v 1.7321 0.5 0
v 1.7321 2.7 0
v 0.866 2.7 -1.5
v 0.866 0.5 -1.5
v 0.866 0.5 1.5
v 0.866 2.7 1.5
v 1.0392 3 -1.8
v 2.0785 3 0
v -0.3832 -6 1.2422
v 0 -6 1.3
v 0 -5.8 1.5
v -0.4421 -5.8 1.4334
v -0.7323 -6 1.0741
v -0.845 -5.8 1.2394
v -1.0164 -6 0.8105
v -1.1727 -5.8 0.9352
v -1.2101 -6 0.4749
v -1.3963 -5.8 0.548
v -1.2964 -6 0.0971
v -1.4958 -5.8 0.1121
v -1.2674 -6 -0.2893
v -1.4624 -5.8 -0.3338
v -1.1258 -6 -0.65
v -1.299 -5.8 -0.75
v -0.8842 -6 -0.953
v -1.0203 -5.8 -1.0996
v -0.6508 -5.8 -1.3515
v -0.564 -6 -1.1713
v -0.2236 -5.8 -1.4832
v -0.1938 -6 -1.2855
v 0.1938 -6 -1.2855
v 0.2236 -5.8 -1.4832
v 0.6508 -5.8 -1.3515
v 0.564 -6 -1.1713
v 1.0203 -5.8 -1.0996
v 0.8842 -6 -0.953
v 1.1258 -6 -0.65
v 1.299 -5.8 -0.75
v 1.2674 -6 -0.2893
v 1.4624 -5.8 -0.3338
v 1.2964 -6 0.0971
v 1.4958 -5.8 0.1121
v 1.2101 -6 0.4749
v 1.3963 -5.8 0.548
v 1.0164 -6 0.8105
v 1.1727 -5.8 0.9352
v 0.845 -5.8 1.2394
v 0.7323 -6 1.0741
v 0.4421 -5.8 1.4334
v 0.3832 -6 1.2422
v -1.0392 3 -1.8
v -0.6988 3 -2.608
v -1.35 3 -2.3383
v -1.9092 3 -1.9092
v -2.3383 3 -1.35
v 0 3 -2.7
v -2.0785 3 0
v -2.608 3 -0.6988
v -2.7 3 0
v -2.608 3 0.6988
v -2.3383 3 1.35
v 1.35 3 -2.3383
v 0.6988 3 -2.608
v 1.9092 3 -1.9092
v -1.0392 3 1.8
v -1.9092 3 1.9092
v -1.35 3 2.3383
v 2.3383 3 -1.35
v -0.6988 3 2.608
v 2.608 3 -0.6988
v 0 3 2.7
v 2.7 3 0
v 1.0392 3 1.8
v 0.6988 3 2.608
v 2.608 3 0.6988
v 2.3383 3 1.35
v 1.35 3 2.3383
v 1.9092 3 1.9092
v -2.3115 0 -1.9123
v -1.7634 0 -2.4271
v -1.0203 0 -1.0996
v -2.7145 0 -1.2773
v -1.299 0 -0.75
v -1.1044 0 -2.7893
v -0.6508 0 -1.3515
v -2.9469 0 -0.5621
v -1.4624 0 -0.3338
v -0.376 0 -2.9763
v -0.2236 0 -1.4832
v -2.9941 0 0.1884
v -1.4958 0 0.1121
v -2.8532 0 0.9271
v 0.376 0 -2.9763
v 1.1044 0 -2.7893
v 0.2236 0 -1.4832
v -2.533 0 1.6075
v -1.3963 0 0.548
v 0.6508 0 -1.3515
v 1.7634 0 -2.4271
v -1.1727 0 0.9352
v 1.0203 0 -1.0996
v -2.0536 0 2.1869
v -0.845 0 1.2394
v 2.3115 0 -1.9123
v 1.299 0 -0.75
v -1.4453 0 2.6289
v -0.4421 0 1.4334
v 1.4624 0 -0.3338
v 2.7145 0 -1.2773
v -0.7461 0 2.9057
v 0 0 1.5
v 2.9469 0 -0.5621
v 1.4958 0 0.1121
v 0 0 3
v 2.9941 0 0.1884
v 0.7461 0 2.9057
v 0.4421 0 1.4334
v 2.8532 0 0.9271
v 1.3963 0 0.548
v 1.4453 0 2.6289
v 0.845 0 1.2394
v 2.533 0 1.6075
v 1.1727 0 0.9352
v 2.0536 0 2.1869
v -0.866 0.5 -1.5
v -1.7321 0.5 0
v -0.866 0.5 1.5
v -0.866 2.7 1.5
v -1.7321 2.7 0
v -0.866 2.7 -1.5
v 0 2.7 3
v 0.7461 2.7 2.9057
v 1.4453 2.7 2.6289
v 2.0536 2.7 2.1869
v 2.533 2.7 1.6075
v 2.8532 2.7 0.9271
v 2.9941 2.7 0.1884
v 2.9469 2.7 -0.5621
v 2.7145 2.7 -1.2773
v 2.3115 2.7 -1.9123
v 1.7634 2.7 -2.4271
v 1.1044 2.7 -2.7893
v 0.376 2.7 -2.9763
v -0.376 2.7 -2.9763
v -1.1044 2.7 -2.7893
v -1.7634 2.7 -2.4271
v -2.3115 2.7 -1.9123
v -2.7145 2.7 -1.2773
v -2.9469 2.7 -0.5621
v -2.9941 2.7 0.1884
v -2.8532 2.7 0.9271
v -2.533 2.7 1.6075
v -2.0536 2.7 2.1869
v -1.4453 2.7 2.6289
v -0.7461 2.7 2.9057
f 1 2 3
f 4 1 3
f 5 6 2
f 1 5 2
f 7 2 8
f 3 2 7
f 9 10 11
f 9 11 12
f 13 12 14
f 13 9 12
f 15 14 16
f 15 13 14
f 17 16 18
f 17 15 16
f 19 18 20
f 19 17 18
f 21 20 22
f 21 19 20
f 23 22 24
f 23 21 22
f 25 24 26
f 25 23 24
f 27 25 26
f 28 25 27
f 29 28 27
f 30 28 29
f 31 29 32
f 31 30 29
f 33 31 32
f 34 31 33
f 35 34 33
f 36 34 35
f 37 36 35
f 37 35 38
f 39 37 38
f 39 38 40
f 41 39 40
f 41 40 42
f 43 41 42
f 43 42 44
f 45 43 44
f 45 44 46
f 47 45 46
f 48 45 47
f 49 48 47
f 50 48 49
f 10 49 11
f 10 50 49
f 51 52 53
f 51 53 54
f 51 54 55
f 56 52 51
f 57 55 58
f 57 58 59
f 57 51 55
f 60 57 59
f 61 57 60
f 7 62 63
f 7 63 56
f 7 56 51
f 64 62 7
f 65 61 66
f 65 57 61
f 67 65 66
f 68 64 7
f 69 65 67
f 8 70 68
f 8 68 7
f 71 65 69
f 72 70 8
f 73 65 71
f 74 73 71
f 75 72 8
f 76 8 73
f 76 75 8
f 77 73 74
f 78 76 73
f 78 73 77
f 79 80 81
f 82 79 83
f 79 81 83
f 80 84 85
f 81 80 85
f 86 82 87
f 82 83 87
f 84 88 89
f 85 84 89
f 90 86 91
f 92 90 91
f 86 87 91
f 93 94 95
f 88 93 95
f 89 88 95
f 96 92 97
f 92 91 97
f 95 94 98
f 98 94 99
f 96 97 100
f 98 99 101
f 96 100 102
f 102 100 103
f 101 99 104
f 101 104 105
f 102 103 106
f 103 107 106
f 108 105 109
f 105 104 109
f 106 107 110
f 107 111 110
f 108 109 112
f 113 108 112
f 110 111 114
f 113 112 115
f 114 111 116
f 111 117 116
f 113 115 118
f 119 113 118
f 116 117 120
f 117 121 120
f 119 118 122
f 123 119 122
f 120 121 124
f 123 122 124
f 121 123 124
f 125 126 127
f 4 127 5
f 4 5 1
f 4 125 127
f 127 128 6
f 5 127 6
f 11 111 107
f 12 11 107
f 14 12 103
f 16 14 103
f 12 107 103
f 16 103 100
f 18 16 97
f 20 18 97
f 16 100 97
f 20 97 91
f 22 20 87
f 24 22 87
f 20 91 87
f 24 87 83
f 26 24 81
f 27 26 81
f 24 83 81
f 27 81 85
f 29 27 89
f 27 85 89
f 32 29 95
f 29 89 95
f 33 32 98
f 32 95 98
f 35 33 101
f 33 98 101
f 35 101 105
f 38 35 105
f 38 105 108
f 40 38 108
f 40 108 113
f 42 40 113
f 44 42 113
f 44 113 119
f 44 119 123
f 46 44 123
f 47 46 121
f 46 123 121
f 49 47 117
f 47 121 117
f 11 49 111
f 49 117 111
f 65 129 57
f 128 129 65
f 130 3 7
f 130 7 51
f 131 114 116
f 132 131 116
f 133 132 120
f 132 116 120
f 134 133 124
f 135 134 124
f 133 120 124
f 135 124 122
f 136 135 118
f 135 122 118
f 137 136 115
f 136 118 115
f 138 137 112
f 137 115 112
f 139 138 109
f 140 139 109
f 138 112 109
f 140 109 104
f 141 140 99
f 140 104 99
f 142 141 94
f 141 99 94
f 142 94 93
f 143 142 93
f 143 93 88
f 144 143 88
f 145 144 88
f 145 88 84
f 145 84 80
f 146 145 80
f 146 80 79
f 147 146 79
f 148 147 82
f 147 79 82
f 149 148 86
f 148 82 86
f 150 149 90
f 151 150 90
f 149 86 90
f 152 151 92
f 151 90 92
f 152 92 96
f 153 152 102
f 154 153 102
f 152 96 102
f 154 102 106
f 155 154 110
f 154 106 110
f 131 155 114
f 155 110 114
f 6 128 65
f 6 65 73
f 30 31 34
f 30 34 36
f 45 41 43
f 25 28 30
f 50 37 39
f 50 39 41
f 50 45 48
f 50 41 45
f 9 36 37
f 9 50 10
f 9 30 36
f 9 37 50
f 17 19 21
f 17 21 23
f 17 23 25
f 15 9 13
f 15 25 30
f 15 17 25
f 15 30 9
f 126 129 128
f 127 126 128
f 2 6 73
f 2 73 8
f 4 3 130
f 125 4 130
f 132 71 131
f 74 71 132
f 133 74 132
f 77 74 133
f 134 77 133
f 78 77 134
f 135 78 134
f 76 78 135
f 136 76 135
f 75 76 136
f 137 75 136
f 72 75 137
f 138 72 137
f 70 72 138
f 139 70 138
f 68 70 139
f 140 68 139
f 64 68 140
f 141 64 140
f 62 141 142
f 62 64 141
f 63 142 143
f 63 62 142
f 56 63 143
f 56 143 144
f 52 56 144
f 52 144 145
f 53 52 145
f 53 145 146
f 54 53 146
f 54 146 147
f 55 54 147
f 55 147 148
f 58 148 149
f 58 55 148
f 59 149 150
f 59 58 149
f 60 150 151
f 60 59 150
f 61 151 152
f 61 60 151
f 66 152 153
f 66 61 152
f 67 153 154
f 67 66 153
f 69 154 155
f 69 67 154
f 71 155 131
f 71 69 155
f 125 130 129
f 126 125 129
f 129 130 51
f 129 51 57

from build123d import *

# Parameters (mm, degrees)
SKETCH1_R           = 3
BOSS_EXTRUDE1_DEPTH = 3
CHAMFER1_SIZE       = 0.3
CUT_EXTRUDE1_DEPTH  = 2.5
CHAMFER2_SIZE       = 0.3
SKETCH3_R           = 1.5
BOSS_EXTRUDE2_DEPTH = 6
CHAMFER3_SIZE       = 0.2


with BuildPart() as part:
    # Sketch1 → Boss-Extrude1 (new body)
    with BuildSketch(Plane(origin=(0, 0, 0), x_dir=(1, 0, 0), z_dir=(0, 1, 0))):
        with Locations(Location((0, 0, 0), (0, 0, 270))):  # turned: the seam where the file's is
            Circle(SKETCH1_R)
    extrude(amount=BOSS_EXTRUDE1_DEPTH)

    # Chamfer1
    chamfer1_edges = [part.edges().sort_by_distance(p)[0] for p in [
        (0, 3, -3),
    ]]
    chamfer(chamfer1_edges, length=CHAMFER1_SIZE)

    # Sketch2 → Cut-Extrude1 (cut)
    with BuildSketch(Plane(origin=(0, 3, 0), x_dir=(1, 0, 0), z_dir=(0, 1, 0))):
        Polygon((1.732050808, 0), (0.866025404, 1.5), (-0.866025404, 1.5), (-1.732050808, 0), (-0.866025404, -1.5), (0.866025404, -1.5), align=None)
    extrude(amount=-CUT_EXTRUDE1_DEPTH, mode=Mode.SUBTRACT)

    # Chamfer2
    chamfer2_edges = [part.edges().sort_by_distance(p)[0] for p in [
        (1.299038106, 3, 0.75),
        (1.299038106, 3, -0.75),
        (0, 3, -1.5),
        (-1.299038106, 3, -0.75),
        (-1.299038106, 3, 0.75),
        (0, 3, 1.5),
    ]]
    chamfer(chamfer2_edges, length=CHAMFER2_SIZE)

    # Sketch3 → Boss-Extrude2 (add)
    with BuildSketch(Plane.XZ):
        with Locations(Location((0, 0, 0), (0, 0, 90))):  # turned: the seam where the file's is
            Circle(SKETCH3_R)
    extrude(amount=BOSS_EXTRUDE2_DEPTH)

    # Chamfer3
    chamfer3_edges = [part.edges().sort_by_distance(p)[0] for p in [
        (0, -6, -1.5),
    ]]
    chamfer(chamfer3_edges, length=CHAMFER3_SIZE)


solid = part.part
